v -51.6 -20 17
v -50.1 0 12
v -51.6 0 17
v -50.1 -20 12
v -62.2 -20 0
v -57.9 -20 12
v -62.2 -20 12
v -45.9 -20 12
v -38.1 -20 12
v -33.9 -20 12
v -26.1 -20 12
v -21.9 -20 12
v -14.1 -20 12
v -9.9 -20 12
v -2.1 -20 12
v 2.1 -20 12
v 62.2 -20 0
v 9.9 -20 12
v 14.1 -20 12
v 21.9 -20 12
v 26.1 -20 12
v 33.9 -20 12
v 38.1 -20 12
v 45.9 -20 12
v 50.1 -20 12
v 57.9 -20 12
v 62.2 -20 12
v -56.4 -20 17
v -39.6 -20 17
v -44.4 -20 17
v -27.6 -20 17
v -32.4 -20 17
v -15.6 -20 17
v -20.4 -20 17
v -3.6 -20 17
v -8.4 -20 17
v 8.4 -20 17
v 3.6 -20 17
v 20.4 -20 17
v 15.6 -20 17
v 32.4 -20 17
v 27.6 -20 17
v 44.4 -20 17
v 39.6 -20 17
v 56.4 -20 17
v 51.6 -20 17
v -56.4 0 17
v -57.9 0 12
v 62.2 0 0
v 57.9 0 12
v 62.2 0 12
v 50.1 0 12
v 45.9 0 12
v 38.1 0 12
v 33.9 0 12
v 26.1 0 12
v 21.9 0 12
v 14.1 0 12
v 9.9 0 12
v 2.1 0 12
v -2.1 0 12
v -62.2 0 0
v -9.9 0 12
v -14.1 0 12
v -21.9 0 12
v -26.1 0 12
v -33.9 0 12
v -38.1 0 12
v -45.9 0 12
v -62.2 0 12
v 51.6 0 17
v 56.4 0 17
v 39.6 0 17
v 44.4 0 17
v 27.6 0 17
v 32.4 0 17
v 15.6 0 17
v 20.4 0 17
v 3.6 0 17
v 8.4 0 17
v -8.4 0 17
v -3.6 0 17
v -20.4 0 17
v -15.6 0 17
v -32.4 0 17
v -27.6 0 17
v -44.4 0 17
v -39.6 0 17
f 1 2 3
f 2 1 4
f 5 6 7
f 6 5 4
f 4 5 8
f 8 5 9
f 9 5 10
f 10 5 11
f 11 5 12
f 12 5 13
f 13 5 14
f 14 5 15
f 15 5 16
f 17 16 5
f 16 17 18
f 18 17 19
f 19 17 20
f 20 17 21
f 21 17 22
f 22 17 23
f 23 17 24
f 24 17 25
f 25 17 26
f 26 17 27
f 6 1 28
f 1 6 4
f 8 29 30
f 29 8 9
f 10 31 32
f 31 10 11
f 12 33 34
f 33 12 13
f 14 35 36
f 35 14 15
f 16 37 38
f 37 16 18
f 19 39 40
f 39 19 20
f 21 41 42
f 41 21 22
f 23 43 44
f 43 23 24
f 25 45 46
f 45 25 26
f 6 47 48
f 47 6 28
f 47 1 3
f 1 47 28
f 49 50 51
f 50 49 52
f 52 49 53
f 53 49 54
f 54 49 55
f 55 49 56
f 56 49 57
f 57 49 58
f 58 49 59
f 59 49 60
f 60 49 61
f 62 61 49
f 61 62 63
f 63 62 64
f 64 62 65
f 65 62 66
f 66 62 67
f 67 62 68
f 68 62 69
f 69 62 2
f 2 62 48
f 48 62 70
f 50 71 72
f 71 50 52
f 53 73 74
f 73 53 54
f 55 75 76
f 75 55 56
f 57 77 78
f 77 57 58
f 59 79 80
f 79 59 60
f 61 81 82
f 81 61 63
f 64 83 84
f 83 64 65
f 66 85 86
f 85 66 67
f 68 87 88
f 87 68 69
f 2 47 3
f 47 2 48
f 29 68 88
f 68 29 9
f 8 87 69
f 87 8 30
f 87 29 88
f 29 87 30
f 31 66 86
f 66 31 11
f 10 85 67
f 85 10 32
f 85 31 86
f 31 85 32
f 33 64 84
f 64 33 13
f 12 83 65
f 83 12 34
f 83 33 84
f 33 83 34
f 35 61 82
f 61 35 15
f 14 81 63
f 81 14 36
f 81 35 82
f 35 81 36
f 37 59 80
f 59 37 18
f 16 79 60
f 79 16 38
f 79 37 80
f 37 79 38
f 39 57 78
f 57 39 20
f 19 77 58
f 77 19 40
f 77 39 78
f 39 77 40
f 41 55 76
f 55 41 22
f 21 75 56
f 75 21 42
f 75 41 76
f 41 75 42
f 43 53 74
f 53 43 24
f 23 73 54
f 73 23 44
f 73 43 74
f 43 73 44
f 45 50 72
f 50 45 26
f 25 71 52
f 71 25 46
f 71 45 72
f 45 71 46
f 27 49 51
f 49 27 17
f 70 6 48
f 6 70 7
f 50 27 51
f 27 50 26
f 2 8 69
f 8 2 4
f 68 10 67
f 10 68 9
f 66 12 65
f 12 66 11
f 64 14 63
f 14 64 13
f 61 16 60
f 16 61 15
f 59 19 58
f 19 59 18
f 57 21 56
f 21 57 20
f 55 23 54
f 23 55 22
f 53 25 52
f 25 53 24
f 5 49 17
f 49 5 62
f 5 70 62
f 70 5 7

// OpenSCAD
$fn = 32;

// ----------------------------------------------------------------------
// Toothed rack, 10 teeth
// 12 mm pitch, 5 mm teeth
// ----------------------------------------------------------------------

// --- parameters (mm) ---
bar_w = 20;     // bar width (Y)
bar_h = 12;     // bar height (Z)
teeth = 10;     // number of teeth
pitch = 12;     // tooth pitch
tooth_h = 5;    // tooth height above the bar
root_w = 8.4;   // tooth width at the root
crest_w = 4.8;  // tooth width at the crest

// --- derived feature positions (mm) ---
span = (teeth - 1) * pitch;  // = 108   distance between the outer teeth
bar_l = span + root_w + 8;   // = 124.4   bar length: teeth plus 4 mm at each end
tooth_x = -span / 2;         // = -54   X of the first tooth
height = bar_h + tooth_h;    // = 17   overall height
feature_centers = [
  [tooth_x + 0 * pitch, -bar_w / 2],
  [tooth_x + 1 * pitch, -bar_w / 2],
  [tooth_x + 2 * pitch, -bar_w / 2],
  [tooth_x + 3 * pitch, -bar_w / 2],
  [tooth_x + 4 * pitch, -bar_w / 2],
  [tooth_x + 5 * pitch, -bar_w / 2],
  [tooth_x + 6 * pitch, -bar_w / 2],
  [tooth_x + 7 * pitch, -bar_w / 2],
  [tooth_x + 8 * pitch, -bar_w / 2],
  [tooth_x + 9 * pitch, -bar_w / 2]
];   // tooth centre line, drives the tooth loop

// bar with a rack of teeth, one extruded trapezoium per centre
module rack_tooth() {
  linear_extrude(height = bar_w)
    polygon(points = [
      [0, 0],
      [root_w, 0],
      [root_w / 2 + crest_w / 2, tooth_h + 1],
      [root_w / 2 - crest_w / 2, tooth_h + 1]
    ]);
}

union() {
  translate([-bar_l / 2, -bar_w, 0]) cube([bar_l, bar_w, bar_h]);
  for (centre = feature_centers)
    translate([centre[0] - root_w / 2, 0, bar_h - 1]) rotate([90, 0, 0]) rack_tooth();
}
